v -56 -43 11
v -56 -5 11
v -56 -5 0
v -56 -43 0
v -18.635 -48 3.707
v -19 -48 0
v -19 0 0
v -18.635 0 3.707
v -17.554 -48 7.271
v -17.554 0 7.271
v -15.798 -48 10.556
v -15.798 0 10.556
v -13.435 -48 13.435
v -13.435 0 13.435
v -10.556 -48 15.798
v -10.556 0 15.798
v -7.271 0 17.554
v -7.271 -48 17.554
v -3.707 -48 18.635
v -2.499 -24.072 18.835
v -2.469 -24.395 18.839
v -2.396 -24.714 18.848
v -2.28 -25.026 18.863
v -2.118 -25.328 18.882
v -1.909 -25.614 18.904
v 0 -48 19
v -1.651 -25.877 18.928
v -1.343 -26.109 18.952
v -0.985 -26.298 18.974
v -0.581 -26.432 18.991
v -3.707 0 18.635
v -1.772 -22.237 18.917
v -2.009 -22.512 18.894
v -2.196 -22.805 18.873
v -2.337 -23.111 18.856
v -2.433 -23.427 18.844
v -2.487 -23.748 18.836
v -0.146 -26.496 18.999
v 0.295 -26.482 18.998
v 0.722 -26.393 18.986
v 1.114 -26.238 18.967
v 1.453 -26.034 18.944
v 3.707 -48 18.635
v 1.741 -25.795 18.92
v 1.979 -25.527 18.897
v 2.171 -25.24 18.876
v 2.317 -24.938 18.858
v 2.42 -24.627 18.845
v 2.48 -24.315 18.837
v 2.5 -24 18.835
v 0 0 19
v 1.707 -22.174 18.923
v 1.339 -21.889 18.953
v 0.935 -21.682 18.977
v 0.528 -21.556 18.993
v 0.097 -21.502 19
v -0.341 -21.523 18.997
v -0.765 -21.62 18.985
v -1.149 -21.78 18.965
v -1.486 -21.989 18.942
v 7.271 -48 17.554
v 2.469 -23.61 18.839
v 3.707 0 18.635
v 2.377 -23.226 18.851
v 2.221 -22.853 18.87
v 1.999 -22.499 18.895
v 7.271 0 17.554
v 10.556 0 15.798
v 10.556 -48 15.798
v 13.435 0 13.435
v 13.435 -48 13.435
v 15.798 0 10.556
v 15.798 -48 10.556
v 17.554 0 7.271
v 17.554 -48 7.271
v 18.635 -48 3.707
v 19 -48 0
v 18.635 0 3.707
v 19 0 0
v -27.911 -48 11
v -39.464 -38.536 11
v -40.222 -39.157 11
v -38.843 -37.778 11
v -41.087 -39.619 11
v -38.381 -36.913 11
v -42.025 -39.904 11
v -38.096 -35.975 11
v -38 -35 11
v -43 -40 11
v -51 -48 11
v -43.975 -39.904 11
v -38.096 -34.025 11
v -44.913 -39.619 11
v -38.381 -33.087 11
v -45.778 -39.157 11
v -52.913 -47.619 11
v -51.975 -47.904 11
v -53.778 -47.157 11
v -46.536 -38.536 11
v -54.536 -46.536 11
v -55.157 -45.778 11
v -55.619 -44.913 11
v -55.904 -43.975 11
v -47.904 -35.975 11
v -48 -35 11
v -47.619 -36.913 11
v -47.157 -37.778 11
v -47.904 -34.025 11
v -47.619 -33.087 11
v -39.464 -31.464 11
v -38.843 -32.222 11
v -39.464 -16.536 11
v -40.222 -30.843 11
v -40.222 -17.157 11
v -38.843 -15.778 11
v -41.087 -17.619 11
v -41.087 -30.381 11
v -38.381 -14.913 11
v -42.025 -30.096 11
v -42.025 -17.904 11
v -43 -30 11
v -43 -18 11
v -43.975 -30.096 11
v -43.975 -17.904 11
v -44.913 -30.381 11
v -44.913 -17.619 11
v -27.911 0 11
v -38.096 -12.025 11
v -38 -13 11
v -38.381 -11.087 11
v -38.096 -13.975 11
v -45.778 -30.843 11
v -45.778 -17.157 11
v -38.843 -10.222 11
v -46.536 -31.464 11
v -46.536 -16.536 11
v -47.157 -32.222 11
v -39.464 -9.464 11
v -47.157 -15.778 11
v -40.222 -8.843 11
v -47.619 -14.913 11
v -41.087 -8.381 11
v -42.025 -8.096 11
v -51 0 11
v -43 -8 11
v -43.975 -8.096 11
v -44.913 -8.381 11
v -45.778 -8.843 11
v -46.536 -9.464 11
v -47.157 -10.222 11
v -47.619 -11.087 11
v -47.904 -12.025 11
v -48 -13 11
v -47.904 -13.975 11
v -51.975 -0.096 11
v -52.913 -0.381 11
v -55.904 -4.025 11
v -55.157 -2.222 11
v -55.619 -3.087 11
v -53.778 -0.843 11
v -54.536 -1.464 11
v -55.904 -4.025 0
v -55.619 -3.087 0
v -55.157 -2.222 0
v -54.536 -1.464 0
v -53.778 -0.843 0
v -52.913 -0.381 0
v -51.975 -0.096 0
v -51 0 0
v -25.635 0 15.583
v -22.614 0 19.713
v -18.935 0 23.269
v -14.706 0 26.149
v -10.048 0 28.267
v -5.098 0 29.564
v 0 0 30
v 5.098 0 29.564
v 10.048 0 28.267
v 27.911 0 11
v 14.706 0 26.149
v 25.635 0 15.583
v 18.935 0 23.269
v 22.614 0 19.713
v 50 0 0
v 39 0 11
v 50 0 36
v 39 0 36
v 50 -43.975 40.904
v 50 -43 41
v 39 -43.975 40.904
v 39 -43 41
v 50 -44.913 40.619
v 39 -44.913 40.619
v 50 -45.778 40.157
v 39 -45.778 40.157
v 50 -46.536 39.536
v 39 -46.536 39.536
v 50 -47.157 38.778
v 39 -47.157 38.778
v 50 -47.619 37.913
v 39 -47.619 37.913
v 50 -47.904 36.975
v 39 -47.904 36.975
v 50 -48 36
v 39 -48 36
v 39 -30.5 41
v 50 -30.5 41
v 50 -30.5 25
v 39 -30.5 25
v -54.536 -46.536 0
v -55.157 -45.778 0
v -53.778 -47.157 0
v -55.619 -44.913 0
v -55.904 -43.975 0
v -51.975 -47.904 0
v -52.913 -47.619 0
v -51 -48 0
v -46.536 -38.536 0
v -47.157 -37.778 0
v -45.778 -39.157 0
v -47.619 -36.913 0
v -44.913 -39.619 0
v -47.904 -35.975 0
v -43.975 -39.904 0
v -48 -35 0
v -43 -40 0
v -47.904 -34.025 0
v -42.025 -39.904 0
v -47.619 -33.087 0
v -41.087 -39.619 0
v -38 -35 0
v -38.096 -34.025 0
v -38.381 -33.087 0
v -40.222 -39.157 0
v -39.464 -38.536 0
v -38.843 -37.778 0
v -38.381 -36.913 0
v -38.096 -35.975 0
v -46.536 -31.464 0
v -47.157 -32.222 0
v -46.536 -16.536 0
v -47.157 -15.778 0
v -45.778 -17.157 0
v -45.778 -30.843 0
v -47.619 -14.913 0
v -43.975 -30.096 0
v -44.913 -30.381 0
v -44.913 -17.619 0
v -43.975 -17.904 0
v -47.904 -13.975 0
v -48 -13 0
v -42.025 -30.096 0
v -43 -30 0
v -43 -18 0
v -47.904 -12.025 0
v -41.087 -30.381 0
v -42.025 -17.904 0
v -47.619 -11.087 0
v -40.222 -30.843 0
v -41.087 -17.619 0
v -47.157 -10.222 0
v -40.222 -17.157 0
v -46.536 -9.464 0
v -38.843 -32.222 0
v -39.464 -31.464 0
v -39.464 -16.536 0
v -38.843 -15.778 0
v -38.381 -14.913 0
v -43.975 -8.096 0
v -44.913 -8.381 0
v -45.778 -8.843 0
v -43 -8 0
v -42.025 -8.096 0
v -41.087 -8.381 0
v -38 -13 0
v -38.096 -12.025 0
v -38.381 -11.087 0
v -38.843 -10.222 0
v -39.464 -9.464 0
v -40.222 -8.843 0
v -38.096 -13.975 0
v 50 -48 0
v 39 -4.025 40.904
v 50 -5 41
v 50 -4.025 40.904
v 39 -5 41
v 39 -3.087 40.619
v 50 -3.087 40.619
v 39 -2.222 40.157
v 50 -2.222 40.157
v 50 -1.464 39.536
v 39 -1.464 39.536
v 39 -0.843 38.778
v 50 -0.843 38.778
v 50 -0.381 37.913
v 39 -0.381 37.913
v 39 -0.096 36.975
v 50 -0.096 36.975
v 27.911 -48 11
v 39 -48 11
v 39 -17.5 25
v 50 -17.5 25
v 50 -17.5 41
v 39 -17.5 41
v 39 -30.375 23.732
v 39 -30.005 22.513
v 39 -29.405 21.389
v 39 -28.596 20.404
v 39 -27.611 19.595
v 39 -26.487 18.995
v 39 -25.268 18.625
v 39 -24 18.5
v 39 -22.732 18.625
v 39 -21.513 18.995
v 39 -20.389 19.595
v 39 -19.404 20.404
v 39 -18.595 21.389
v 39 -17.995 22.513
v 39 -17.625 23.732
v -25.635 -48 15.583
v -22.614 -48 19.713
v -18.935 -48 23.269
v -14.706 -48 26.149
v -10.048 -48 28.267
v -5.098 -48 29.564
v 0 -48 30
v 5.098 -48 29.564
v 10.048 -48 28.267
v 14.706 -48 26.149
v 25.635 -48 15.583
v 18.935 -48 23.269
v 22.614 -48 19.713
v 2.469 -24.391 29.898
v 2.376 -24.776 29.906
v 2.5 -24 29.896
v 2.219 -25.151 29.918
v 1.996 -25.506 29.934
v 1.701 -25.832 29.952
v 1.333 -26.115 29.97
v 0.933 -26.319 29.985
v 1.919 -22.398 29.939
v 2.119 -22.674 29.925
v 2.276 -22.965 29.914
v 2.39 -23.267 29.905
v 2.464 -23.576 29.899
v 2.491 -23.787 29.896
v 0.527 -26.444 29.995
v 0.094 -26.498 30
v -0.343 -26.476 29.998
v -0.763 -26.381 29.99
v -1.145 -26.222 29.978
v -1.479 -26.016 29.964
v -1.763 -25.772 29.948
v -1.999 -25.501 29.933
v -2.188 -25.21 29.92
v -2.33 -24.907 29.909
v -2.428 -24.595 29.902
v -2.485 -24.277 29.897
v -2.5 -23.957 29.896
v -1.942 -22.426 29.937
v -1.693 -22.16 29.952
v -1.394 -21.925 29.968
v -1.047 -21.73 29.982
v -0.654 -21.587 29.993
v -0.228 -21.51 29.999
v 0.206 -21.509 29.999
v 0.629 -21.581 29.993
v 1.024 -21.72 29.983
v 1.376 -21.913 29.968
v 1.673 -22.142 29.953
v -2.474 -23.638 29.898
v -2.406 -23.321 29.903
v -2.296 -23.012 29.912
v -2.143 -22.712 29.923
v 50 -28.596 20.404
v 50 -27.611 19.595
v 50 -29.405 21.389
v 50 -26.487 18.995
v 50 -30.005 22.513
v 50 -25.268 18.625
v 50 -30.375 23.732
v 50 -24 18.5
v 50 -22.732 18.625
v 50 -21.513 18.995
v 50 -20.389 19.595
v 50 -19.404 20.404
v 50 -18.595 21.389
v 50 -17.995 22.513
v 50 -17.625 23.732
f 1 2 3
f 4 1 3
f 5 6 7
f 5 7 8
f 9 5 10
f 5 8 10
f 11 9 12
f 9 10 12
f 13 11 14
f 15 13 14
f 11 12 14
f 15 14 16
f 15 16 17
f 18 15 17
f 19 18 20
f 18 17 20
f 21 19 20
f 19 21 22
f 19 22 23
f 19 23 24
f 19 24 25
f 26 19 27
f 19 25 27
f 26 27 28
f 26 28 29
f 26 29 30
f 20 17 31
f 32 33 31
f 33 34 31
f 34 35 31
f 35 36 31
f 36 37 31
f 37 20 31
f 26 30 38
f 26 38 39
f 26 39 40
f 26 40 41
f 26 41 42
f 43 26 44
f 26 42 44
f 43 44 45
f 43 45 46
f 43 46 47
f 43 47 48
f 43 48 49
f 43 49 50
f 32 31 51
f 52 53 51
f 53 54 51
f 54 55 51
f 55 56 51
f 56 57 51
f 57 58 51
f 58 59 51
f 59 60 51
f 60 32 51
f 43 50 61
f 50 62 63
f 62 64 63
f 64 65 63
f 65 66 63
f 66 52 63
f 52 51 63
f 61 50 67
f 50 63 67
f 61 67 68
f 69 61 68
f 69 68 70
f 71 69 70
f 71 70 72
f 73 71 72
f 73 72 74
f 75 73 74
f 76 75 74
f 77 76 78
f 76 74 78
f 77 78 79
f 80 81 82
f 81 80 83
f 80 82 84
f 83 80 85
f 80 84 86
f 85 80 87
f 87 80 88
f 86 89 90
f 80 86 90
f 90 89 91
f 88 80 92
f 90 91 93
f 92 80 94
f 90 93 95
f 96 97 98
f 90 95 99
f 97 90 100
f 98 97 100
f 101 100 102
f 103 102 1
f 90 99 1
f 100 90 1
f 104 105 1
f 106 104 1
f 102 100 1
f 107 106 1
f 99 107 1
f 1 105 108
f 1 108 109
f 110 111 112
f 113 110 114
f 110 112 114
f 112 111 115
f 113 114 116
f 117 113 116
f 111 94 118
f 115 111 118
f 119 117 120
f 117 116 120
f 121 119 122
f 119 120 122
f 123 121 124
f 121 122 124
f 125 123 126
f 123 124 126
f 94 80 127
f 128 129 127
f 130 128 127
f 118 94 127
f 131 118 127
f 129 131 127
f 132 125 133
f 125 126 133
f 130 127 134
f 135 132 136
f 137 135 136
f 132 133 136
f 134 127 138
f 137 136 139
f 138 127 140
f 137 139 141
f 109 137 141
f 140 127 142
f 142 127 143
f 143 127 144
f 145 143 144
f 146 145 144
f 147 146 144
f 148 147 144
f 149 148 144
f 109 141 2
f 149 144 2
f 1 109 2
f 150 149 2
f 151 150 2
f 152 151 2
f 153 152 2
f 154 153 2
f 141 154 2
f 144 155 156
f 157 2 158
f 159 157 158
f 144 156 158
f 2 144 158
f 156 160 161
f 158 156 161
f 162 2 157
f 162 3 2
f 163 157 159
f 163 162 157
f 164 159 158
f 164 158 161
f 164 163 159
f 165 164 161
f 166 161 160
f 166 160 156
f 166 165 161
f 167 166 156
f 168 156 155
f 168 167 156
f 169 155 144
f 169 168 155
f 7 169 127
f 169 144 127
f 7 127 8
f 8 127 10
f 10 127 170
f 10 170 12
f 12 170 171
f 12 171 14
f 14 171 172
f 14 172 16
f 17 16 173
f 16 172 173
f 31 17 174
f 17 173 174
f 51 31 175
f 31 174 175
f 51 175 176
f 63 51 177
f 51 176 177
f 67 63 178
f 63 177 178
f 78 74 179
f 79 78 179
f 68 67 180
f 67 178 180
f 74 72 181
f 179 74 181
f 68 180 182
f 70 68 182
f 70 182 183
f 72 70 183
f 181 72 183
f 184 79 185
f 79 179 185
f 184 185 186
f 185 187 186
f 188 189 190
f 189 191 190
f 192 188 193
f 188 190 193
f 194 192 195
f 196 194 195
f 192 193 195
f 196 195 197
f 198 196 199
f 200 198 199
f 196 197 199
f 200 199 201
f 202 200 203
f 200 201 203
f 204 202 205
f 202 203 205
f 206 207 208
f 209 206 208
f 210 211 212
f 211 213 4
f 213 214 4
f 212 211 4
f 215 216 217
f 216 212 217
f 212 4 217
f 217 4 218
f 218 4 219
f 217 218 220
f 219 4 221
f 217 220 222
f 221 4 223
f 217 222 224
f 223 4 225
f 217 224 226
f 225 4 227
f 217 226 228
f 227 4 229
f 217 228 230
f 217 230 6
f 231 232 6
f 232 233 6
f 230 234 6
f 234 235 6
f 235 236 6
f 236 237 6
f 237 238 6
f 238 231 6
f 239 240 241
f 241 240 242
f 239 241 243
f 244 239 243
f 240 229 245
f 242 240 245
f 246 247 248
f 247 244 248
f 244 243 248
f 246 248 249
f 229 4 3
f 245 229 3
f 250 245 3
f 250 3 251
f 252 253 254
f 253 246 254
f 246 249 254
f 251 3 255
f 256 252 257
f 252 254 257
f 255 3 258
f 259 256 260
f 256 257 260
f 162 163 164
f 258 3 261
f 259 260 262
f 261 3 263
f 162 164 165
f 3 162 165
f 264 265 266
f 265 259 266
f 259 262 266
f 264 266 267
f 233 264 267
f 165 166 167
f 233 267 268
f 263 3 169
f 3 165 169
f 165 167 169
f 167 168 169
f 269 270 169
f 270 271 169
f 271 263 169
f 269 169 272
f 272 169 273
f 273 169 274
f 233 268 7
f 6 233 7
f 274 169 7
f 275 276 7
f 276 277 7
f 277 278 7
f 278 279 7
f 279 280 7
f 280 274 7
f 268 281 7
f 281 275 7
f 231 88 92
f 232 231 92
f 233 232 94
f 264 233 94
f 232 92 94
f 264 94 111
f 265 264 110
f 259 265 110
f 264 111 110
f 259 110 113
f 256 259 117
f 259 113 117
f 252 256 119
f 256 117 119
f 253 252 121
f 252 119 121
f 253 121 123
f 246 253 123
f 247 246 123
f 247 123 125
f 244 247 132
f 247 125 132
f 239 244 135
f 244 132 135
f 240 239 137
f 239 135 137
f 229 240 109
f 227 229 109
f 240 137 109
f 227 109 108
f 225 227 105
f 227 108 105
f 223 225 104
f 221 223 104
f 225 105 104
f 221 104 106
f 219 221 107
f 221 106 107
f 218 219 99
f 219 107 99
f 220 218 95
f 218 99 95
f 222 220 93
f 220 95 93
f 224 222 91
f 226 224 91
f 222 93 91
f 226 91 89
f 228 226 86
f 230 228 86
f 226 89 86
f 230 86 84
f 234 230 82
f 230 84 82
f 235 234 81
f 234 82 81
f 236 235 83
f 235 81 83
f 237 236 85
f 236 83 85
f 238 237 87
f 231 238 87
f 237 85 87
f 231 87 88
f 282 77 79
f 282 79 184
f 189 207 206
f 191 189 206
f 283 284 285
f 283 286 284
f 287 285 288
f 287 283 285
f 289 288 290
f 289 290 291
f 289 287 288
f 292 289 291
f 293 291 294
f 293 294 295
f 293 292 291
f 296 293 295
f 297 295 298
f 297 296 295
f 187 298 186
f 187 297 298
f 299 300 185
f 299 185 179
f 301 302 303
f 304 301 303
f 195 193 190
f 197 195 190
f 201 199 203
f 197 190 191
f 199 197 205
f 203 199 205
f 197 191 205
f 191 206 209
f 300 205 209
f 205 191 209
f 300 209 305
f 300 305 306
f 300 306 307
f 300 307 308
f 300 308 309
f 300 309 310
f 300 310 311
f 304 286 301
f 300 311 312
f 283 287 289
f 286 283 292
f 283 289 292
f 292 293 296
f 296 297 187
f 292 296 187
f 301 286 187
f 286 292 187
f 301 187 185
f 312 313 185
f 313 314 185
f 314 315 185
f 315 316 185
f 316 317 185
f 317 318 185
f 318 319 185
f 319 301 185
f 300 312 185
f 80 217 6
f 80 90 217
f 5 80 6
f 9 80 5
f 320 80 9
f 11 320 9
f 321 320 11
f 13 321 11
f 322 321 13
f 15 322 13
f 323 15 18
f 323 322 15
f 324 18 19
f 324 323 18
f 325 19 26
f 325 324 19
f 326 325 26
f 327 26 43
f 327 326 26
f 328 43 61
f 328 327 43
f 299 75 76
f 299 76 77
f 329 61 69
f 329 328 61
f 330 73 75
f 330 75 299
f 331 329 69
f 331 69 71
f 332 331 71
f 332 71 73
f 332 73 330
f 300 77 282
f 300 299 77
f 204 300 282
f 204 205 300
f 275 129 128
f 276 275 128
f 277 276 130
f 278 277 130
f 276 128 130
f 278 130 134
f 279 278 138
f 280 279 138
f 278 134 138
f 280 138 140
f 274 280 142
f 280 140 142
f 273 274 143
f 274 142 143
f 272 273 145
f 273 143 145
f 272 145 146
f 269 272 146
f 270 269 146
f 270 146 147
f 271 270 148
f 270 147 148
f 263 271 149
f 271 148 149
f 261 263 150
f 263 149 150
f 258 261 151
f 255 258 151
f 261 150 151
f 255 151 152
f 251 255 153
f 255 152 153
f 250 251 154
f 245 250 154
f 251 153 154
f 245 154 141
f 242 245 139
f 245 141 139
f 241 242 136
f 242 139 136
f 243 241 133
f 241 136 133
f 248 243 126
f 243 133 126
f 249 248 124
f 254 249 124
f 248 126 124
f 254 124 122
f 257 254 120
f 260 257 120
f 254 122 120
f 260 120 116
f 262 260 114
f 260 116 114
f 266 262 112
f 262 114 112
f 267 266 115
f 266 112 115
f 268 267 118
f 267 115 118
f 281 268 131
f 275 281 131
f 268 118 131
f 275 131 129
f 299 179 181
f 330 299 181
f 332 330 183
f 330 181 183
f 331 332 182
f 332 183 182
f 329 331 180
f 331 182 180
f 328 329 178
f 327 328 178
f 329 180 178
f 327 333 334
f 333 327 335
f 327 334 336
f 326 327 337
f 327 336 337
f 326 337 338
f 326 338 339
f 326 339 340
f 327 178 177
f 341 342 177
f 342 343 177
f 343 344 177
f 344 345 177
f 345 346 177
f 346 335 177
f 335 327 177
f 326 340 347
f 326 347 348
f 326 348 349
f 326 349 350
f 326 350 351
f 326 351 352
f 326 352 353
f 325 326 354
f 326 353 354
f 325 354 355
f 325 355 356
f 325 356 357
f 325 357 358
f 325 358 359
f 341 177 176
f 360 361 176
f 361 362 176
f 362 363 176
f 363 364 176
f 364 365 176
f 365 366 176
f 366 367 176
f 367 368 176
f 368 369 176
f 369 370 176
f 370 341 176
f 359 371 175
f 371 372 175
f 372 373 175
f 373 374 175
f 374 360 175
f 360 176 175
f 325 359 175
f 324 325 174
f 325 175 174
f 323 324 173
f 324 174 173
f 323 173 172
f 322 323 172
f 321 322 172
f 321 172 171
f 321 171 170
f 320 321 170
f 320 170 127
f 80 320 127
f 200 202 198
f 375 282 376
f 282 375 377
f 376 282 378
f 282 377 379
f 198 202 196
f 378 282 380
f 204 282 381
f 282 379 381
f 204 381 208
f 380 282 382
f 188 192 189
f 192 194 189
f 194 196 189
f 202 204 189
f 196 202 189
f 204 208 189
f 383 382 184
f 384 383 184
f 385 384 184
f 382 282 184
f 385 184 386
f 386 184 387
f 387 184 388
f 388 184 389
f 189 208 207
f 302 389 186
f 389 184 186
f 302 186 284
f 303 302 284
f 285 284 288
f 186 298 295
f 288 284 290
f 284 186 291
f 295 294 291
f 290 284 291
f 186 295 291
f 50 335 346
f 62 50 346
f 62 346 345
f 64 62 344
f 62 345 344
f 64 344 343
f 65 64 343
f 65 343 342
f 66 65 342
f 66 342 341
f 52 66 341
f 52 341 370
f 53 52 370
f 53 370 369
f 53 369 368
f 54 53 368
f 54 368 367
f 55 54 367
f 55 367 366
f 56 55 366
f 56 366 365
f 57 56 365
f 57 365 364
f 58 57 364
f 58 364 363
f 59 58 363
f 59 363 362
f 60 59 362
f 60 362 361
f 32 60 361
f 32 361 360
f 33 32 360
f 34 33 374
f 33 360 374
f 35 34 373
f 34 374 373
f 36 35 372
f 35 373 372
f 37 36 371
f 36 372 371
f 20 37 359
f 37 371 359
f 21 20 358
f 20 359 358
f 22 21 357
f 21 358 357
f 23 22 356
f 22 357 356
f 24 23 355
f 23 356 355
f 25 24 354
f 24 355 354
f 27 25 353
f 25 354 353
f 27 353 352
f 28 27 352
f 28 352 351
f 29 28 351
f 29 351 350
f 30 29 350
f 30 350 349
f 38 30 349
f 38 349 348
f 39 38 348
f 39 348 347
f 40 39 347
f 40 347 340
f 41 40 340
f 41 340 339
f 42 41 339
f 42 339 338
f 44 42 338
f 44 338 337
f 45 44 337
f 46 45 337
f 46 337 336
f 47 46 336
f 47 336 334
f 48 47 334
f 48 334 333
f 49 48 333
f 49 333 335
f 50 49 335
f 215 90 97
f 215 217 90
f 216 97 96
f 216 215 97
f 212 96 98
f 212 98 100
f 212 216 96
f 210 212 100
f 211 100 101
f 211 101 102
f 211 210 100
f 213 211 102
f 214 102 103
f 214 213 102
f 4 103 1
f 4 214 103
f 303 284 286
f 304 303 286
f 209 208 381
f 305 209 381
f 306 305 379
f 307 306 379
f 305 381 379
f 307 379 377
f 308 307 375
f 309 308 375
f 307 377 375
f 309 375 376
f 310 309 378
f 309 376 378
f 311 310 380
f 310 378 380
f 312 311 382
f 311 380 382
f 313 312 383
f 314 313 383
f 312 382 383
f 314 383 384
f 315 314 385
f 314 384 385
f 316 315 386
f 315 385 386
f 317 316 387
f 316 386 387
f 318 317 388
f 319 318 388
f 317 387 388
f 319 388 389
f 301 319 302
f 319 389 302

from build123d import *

# Parameters (mm, degrees)
F1_DEPTH  = 48
F2_R      = 5
F3_R      = 5
F5_DEPTH  = 11
F6_R      = 5
F7_R      = 5
F8_R      = 5
F9_DEPTH  = 11
F11_R     = 2.5
F12_DEPTH = 11.1661918982


with BuildPart() as f1:
    # F0 (on Front) → F1 (new body)
    with BuildSketch(Plane.XZ):
        with BuildLine():
            ThreePointArc((-19, 0), (0, 19), (19, 0))
            Line((19, 0), (30, 0))
            Line((30, 0), (50, 0))
            Line((50, 0), (50, 41))
            Line((50, 41), (39, 41))
            Line((39, 41), (39, 11))
            Line((39, 11), (27.9105714739, 11))
            ThreePointArc((27.9105714739, 11), (0, 30), (-27.9105714739, 11))
            Line((-27.9105714739, 11), (-56, 11))
            Line((-56, 11), (-56, 0))
            Line((-56, 0), (-30, 0))
            Line((-30, 0), (-19, 0))
        make_face()
    extrude(amount=F1_DEPTH)

    # F2
    f2_edges = [f1.edges().sort_by_distance(p)[0] for p in [
        (44.5, -48, 41),
    ]]
    fillet(f2_edges, radius=F2_R)

    # F3
    f3_edges = [f1.edges().sort_by_distance(p)[0] for p in [
        (44.5, 0, 41),
    ]]
    fillet(f3_edges, radius=F3_R)

    # F4 (on face) → F5 (cut, through all)
    with BuildSketch(Plane.YZ.offset(50)):
        with BuildLine():
            Line((-17.5, 25), (-17.5, 41))
            Line((-17.5, 41), (-30.5, 41))
            Line((-30.5, 41), (-30.5, 25))
            ThreePointArc((-30.5, 25), (-24, 18.5), (-17.5, 25))
        make_face()
    extrude(amount=-F5_DEPTH, mode=Mode.SUBTRACT)

    # F6
    f6_edges = [f1.edges().sort_by_distance(p)[0] for p in [
        (-56, -48, 5.5),
    ]]
    fillet(f6_edges, radius=F6_R)

    # F7
    f7_edges = [f1.edges().sort_by_distance(p)[0] for p in [
        (-56, 0, 5.5),
    ]]
    fillet(f7_edges, radius=F7_R)

    # F8 (on face) → F9 (cut, through all)
    with BuildSketch(Plane.XY.offset(11)):
        with Locations((-43, -13)):
            Circle(F8_R)
        with Locations((-43, -35)):
            Circle(F8_R)
    extrude(amount=-F9_DEPTH, mode=Mode.SUBTRACT)

    # F11 (on offset) → F12 (cut, through all)
    with BuildSketch(Plane.XY.offset(30)):
        with Locations((0, -24)):
            Circle(F11_R)
    extrude(amount=-F12_DEPTH, mode=Mode.SUBTRACT)


solid = f1.part
